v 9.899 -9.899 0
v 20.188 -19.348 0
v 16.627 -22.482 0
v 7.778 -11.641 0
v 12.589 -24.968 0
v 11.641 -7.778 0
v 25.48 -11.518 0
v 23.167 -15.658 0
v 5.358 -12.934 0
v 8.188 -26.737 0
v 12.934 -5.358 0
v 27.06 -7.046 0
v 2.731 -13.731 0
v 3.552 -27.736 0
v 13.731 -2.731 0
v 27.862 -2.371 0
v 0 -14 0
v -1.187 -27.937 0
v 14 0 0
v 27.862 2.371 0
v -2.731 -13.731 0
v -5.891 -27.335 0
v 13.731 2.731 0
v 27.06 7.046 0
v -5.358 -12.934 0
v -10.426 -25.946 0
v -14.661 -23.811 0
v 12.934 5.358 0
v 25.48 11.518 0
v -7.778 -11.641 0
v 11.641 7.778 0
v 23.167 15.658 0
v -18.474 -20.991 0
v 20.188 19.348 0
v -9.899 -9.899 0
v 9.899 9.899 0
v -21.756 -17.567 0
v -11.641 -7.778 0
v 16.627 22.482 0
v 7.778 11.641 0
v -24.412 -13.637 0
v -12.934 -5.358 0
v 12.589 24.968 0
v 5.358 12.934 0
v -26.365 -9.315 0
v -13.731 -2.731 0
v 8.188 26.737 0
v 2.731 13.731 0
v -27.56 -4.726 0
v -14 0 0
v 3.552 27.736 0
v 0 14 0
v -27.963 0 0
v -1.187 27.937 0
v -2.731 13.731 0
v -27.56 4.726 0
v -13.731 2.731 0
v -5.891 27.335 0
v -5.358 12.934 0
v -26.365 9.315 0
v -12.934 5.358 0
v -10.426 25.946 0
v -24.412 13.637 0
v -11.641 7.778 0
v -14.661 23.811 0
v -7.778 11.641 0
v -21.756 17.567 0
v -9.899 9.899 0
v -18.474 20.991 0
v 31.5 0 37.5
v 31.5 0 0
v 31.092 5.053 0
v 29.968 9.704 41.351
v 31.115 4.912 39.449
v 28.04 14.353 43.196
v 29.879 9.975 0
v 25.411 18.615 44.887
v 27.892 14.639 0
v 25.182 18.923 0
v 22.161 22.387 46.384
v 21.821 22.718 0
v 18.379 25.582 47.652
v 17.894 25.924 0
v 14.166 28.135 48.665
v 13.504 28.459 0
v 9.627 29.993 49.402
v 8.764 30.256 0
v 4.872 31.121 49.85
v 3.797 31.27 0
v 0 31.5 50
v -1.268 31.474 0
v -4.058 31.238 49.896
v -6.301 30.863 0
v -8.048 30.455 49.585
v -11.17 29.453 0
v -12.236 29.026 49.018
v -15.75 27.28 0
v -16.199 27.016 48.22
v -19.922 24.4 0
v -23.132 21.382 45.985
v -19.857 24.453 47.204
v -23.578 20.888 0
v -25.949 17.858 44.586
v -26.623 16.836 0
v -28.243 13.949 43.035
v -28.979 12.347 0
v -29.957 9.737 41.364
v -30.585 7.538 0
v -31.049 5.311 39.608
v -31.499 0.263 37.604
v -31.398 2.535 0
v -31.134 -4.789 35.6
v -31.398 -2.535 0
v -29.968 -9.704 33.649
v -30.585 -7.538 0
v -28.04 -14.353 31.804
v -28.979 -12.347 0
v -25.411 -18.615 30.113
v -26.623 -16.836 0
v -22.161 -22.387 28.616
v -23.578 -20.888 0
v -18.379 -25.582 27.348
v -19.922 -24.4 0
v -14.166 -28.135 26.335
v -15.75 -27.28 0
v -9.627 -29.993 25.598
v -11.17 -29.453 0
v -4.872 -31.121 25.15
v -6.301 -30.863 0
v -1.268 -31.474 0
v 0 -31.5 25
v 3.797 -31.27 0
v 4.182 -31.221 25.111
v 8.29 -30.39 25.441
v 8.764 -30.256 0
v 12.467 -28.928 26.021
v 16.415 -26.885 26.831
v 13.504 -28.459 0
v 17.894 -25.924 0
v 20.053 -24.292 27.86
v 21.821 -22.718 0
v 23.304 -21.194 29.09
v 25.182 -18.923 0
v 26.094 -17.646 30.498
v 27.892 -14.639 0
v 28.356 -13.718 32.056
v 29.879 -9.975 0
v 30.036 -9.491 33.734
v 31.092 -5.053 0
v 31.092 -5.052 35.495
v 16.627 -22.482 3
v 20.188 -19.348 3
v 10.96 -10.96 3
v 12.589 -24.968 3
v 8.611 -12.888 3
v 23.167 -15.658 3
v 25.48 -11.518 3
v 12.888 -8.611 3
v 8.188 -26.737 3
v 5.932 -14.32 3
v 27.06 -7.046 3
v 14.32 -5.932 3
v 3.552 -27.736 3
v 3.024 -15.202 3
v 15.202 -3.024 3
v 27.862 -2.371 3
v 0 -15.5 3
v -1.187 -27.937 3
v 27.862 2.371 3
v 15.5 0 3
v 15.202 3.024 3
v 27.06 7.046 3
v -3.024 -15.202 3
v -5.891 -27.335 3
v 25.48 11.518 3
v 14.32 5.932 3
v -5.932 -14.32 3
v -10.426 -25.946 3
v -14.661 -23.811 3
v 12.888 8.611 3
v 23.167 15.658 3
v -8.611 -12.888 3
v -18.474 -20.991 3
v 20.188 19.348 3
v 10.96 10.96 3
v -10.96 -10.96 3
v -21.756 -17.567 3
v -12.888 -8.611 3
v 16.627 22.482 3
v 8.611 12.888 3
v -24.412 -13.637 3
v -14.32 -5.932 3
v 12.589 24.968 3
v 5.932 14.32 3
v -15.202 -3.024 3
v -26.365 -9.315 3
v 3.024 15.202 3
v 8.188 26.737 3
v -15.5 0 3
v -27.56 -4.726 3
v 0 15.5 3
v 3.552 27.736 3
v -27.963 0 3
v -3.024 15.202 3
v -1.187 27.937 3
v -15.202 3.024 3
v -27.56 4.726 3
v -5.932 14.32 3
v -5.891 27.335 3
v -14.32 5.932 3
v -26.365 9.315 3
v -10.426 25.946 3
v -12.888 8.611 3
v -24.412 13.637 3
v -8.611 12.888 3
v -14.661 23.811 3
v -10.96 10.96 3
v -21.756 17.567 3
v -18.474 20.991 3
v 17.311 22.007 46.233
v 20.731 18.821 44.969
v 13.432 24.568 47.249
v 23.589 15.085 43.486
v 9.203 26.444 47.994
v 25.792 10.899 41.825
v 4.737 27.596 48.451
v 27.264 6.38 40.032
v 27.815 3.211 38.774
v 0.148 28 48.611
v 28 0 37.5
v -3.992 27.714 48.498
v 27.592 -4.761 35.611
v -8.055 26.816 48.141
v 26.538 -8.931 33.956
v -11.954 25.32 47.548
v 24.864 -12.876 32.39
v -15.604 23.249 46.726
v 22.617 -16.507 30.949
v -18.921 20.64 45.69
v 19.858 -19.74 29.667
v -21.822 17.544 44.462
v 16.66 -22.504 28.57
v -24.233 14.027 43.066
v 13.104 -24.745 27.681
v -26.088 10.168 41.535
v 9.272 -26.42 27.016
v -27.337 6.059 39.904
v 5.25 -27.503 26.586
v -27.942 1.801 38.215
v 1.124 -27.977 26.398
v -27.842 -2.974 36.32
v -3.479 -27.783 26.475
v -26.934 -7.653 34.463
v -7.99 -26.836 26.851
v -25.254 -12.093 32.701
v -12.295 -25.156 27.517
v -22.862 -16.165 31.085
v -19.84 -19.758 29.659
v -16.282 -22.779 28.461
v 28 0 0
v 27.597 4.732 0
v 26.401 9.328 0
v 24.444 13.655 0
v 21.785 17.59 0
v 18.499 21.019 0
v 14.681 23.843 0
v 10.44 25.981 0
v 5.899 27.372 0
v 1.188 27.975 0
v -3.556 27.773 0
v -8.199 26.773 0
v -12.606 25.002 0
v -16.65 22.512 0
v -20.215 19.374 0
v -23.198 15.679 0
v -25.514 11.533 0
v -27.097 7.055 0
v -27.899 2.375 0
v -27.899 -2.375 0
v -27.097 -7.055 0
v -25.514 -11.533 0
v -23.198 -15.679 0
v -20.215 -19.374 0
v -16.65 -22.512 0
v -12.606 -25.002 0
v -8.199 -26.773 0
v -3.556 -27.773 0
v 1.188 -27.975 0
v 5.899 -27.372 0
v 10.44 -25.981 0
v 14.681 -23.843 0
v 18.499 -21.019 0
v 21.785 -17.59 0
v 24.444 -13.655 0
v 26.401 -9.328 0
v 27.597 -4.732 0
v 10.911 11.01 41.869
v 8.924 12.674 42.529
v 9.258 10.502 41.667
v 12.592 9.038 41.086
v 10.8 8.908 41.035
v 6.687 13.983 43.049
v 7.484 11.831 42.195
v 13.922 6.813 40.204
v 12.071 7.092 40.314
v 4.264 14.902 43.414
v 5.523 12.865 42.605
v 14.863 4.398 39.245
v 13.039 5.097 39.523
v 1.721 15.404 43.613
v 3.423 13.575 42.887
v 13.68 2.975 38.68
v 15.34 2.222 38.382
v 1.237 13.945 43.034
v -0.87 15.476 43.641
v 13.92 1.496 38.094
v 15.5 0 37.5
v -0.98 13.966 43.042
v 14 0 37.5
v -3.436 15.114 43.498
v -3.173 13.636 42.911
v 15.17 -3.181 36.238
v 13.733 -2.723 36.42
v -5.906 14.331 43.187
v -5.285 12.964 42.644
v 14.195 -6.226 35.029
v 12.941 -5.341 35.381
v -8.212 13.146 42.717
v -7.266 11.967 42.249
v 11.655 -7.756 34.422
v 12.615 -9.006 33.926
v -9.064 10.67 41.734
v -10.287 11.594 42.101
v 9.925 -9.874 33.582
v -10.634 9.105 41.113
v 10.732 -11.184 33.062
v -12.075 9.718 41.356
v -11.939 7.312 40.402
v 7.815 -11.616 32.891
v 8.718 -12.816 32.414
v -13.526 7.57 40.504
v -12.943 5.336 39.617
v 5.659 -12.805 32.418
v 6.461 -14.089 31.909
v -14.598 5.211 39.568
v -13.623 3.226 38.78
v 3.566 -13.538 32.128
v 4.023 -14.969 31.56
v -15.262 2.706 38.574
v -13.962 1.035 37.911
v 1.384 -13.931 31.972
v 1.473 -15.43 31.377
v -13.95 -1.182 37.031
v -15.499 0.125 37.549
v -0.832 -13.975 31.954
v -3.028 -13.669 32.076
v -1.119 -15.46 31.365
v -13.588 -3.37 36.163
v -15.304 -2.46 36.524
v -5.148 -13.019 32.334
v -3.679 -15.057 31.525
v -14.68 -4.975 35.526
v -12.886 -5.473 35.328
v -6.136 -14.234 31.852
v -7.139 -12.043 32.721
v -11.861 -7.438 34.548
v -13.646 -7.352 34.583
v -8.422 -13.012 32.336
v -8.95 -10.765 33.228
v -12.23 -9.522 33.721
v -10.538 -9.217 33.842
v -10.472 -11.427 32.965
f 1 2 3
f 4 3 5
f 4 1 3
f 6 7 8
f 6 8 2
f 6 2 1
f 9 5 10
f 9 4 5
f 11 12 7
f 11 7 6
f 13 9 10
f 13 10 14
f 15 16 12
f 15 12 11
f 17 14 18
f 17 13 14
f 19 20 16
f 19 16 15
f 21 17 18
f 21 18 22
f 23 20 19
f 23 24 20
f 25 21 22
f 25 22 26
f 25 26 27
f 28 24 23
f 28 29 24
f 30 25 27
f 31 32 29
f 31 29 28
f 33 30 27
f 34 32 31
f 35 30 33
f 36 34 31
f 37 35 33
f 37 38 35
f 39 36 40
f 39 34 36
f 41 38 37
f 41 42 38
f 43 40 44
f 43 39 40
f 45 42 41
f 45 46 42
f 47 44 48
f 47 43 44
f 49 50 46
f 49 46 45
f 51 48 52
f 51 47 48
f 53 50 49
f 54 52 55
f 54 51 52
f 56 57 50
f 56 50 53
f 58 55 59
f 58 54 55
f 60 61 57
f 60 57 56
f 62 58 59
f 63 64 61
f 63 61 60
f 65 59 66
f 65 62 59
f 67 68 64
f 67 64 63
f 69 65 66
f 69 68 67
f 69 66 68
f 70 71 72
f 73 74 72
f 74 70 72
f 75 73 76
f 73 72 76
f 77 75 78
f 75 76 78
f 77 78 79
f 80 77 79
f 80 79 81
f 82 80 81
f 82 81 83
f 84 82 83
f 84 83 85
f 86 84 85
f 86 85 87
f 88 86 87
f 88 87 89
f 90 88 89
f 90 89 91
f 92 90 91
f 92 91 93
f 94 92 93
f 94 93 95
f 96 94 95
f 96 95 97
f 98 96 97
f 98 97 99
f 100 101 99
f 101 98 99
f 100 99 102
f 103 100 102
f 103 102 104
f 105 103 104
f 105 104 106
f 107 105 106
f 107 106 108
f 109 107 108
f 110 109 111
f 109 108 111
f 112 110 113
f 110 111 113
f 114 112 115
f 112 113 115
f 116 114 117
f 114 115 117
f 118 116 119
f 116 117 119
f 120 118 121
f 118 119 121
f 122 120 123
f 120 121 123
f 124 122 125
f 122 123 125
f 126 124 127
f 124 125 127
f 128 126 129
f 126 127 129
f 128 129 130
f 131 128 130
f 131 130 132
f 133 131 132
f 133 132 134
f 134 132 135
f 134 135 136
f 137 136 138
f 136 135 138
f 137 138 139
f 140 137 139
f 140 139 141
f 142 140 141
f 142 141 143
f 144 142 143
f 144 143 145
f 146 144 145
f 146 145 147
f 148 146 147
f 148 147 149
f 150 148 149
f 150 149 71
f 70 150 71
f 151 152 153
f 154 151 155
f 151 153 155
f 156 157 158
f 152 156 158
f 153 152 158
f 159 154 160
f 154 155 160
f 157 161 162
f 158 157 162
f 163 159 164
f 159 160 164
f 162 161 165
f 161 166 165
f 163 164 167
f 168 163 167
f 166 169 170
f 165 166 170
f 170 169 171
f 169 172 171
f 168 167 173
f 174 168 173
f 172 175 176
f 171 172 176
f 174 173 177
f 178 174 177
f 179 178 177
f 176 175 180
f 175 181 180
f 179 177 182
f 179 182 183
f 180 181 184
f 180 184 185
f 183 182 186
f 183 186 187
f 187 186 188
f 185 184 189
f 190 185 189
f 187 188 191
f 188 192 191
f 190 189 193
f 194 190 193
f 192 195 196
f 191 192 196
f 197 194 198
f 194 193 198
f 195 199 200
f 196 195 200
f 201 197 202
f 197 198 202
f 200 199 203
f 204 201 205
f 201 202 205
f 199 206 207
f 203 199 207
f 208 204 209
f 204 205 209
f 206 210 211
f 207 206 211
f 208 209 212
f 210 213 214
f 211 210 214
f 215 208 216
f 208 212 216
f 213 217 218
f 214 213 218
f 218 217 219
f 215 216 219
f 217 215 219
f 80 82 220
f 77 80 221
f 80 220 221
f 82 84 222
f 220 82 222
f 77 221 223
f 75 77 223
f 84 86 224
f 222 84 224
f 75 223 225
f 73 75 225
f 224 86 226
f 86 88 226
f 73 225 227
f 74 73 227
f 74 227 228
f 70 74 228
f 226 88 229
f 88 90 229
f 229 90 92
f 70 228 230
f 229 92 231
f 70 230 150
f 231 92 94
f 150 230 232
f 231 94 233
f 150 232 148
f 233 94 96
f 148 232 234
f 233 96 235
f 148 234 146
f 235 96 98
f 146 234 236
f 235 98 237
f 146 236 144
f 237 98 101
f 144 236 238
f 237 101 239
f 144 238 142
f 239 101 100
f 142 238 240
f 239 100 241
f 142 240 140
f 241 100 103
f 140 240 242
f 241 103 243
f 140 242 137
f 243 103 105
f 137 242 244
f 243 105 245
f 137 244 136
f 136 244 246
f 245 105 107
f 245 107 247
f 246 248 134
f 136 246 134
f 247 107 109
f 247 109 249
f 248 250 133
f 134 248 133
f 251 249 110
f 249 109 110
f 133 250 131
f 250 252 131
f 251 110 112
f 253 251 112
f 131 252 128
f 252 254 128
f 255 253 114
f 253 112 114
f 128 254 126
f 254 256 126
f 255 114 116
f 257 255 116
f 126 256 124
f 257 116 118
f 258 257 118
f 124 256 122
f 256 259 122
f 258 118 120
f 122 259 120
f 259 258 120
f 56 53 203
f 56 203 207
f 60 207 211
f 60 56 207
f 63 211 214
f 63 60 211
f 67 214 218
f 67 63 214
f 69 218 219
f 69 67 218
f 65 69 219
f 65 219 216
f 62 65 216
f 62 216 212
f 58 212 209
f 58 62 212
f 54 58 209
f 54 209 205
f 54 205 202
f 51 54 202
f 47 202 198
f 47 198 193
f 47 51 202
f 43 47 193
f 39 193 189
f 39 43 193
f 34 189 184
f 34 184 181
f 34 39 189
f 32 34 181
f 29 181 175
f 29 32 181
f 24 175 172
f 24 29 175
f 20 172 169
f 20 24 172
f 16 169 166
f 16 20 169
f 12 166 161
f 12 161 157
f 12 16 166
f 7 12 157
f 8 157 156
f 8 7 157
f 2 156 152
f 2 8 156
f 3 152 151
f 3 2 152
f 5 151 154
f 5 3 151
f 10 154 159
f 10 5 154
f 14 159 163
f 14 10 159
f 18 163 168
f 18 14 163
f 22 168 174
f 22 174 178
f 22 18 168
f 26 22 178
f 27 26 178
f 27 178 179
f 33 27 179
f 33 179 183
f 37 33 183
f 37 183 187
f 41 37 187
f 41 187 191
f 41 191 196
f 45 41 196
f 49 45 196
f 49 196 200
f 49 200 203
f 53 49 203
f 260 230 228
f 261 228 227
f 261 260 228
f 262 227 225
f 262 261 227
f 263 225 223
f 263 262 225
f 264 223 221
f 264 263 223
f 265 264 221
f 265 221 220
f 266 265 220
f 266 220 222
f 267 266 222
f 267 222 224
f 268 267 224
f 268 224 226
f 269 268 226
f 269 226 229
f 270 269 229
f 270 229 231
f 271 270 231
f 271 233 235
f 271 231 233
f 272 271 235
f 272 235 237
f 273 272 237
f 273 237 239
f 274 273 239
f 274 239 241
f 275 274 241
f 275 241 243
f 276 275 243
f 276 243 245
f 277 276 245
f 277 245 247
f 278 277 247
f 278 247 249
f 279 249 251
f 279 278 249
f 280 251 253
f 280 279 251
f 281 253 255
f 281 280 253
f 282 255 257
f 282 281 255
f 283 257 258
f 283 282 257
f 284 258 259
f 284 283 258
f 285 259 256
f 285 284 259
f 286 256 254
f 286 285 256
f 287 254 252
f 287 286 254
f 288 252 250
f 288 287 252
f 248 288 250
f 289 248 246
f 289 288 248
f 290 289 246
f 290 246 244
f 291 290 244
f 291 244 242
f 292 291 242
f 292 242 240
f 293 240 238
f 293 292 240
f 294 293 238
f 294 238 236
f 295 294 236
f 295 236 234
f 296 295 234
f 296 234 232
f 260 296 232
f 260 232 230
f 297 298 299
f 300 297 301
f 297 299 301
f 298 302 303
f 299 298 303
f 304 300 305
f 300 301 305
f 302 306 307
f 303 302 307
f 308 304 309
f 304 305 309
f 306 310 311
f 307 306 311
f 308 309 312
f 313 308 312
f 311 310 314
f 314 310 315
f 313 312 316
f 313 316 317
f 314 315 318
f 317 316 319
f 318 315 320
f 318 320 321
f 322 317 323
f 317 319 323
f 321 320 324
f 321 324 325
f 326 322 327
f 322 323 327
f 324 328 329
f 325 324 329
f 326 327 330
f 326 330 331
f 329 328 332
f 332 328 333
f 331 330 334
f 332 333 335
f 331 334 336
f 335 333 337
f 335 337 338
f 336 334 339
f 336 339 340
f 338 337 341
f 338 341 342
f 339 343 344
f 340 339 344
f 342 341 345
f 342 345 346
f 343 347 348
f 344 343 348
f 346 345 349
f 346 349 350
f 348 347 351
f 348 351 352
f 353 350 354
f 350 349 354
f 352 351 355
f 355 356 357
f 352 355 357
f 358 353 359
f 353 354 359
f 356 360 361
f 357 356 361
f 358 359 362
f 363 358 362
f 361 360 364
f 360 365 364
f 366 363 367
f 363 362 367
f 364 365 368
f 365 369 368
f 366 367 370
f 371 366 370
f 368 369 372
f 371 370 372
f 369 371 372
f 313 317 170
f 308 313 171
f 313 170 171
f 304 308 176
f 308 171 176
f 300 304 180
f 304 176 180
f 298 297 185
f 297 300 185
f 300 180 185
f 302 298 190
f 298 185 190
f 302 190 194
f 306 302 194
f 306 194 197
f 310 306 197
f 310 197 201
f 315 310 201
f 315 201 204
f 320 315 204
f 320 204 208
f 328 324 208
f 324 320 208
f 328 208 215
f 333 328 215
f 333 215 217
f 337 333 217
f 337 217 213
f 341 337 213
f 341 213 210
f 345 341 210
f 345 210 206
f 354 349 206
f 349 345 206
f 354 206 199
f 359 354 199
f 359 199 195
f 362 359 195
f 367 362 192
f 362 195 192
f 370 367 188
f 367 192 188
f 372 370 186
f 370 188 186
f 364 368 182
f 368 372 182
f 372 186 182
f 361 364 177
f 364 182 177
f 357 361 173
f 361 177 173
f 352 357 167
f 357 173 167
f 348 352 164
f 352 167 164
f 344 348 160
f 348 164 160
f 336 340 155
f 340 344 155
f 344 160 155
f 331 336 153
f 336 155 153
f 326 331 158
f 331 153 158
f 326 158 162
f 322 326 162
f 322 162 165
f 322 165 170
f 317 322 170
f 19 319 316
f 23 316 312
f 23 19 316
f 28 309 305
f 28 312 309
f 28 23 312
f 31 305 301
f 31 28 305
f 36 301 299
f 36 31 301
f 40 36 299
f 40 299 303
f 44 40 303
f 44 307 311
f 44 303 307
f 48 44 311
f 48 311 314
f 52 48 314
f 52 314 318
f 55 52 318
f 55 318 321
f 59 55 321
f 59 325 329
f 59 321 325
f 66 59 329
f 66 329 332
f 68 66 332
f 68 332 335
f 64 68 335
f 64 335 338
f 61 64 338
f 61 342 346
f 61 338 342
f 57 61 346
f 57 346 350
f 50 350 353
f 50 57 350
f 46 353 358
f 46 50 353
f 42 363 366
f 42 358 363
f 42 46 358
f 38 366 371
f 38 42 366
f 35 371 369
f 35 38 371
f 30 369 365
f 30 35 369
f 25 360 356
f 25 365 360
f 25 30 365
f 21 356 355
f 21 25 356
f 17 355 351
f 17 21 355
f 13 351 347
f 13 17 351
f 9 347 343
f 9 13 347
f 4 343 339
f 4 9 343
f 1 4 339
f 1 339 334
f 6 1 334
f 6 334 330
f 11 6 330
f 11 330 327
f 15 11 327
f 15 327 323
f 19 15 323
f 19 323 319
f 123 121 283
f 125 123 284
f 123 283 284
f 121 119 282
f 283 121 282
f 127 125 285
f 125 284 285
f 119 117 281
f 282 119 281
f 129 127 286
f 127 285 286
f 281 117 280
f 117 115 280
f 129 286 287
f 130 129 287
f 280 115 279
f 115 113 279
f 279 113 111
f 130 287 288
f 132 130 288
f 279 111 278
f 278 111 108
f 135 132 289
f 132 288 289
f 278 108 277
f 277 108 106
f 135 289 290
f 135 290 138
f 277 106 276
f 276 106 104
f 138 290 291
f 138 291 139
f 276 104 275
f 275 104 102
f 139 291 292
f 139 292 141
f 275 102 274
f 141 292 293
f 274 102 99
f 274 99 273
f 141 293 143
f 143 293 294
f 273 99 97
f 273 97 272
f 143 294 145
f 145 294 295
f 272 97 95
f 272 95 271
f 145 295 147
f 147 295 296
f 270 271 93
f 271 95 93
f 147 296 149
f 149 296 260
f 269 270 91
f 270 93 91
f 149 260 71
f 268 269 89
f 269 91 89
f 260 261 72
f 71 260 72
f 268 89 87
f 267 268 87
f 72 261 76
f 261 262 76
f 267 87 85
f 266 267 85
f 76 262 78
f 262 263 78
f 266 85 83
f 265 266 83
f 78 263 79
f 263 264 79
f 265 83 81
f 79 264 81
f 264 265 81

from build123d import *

# Parameters (mm, degrees)
SKETCH1_R               = 15.5
SKETCH1_R_2             = 14
BOSS_EXTRUDE2_DEPTH     = 50
SKETCH3_R               = 31.5
SKETCH3_R_2             = 28
BOSS_EXTRUDE3_DEPTH     = 50
CUT_EXTRUDE1_DEPTH      = 2500
CUT_EXTRUDE1_DEPTH_BACK = 10216
SKETCH15_R              = 27.962515844
SKETCH15_R_2            = 15.5
BOSS_EXTRUDE4_DEPTH     = 3


with BuildPart() as part:
    # Sketch1 → Boss-Extrude2 (new body)
    with BuildSketch(Plane.XY):
        Circle(SKETCH1_R)
        Circle(SKETCH1_R_2, mode=Mode.SUBTRACT)
    extrude(amount=BOSS_EXTRUDE2_DEPTH)


with BuildPart() as body_2:
    # Sketch3 → Boss-Extrude3 (new body)
    with BuildSketch(Plane.XY):
        Circle(SKETCH3_R)
        Circle(SKETCH3_R_2, mode=Mode.SUBTRACT)
    extrude(amount=BOSS_EXTRUDE3_DEPTH)


with BuildPart() as cut_extrude1_tool:
    # Sketch4 → Cut-Extrude1 (new, two sides: drawn at the far end of the back side and taken through both)
    with BuildSketch(Plane(origin=(0, 0, 0), x_dir=(0, 0, -1), z_dir=(1, 0, 0)).offset(-CUT_EXTRUDE1_DEPTH_BACK)):
        Polygon((-50, 31.5), (-25, -31.5), (-50, -31.5), align=None)
    extrude(amount=CUT_EXTRUDE1_DEPTH + CUT_EXTRUDE1_DEPTH_BACK)


with BuildPart() as part_1:
    add(part.part)

    # Cut-Extrude1: cut by cut_extrude1_tool
    add(cut_extrude1_tool.part, mode=Mode.SUBTRACT)

    # Sketch15 → Boss-Extrude4 (add)
    with BuildSketch(Plane(origin=(0, 0, 0), x_dir=(-1, 0, 0), z_dir=(0, 0, -1))):
        Circle(SKETCH15_R)
        Circle(SKETCH15_R_2, mode=Mode.SUBTRACT)
    extrude(amount=-BOSS_EXTRUDE4_DEPTH)


with BuildPart() as body_2_1:
    add(body_2.part)

    # Cut-Extrude1: cut by cut_extrude1_tool
    add(cut_extrude1_tool.part, mode=Mode.SUBTRACT)


solid = Compound([part_1.part, body_2_1.part])
